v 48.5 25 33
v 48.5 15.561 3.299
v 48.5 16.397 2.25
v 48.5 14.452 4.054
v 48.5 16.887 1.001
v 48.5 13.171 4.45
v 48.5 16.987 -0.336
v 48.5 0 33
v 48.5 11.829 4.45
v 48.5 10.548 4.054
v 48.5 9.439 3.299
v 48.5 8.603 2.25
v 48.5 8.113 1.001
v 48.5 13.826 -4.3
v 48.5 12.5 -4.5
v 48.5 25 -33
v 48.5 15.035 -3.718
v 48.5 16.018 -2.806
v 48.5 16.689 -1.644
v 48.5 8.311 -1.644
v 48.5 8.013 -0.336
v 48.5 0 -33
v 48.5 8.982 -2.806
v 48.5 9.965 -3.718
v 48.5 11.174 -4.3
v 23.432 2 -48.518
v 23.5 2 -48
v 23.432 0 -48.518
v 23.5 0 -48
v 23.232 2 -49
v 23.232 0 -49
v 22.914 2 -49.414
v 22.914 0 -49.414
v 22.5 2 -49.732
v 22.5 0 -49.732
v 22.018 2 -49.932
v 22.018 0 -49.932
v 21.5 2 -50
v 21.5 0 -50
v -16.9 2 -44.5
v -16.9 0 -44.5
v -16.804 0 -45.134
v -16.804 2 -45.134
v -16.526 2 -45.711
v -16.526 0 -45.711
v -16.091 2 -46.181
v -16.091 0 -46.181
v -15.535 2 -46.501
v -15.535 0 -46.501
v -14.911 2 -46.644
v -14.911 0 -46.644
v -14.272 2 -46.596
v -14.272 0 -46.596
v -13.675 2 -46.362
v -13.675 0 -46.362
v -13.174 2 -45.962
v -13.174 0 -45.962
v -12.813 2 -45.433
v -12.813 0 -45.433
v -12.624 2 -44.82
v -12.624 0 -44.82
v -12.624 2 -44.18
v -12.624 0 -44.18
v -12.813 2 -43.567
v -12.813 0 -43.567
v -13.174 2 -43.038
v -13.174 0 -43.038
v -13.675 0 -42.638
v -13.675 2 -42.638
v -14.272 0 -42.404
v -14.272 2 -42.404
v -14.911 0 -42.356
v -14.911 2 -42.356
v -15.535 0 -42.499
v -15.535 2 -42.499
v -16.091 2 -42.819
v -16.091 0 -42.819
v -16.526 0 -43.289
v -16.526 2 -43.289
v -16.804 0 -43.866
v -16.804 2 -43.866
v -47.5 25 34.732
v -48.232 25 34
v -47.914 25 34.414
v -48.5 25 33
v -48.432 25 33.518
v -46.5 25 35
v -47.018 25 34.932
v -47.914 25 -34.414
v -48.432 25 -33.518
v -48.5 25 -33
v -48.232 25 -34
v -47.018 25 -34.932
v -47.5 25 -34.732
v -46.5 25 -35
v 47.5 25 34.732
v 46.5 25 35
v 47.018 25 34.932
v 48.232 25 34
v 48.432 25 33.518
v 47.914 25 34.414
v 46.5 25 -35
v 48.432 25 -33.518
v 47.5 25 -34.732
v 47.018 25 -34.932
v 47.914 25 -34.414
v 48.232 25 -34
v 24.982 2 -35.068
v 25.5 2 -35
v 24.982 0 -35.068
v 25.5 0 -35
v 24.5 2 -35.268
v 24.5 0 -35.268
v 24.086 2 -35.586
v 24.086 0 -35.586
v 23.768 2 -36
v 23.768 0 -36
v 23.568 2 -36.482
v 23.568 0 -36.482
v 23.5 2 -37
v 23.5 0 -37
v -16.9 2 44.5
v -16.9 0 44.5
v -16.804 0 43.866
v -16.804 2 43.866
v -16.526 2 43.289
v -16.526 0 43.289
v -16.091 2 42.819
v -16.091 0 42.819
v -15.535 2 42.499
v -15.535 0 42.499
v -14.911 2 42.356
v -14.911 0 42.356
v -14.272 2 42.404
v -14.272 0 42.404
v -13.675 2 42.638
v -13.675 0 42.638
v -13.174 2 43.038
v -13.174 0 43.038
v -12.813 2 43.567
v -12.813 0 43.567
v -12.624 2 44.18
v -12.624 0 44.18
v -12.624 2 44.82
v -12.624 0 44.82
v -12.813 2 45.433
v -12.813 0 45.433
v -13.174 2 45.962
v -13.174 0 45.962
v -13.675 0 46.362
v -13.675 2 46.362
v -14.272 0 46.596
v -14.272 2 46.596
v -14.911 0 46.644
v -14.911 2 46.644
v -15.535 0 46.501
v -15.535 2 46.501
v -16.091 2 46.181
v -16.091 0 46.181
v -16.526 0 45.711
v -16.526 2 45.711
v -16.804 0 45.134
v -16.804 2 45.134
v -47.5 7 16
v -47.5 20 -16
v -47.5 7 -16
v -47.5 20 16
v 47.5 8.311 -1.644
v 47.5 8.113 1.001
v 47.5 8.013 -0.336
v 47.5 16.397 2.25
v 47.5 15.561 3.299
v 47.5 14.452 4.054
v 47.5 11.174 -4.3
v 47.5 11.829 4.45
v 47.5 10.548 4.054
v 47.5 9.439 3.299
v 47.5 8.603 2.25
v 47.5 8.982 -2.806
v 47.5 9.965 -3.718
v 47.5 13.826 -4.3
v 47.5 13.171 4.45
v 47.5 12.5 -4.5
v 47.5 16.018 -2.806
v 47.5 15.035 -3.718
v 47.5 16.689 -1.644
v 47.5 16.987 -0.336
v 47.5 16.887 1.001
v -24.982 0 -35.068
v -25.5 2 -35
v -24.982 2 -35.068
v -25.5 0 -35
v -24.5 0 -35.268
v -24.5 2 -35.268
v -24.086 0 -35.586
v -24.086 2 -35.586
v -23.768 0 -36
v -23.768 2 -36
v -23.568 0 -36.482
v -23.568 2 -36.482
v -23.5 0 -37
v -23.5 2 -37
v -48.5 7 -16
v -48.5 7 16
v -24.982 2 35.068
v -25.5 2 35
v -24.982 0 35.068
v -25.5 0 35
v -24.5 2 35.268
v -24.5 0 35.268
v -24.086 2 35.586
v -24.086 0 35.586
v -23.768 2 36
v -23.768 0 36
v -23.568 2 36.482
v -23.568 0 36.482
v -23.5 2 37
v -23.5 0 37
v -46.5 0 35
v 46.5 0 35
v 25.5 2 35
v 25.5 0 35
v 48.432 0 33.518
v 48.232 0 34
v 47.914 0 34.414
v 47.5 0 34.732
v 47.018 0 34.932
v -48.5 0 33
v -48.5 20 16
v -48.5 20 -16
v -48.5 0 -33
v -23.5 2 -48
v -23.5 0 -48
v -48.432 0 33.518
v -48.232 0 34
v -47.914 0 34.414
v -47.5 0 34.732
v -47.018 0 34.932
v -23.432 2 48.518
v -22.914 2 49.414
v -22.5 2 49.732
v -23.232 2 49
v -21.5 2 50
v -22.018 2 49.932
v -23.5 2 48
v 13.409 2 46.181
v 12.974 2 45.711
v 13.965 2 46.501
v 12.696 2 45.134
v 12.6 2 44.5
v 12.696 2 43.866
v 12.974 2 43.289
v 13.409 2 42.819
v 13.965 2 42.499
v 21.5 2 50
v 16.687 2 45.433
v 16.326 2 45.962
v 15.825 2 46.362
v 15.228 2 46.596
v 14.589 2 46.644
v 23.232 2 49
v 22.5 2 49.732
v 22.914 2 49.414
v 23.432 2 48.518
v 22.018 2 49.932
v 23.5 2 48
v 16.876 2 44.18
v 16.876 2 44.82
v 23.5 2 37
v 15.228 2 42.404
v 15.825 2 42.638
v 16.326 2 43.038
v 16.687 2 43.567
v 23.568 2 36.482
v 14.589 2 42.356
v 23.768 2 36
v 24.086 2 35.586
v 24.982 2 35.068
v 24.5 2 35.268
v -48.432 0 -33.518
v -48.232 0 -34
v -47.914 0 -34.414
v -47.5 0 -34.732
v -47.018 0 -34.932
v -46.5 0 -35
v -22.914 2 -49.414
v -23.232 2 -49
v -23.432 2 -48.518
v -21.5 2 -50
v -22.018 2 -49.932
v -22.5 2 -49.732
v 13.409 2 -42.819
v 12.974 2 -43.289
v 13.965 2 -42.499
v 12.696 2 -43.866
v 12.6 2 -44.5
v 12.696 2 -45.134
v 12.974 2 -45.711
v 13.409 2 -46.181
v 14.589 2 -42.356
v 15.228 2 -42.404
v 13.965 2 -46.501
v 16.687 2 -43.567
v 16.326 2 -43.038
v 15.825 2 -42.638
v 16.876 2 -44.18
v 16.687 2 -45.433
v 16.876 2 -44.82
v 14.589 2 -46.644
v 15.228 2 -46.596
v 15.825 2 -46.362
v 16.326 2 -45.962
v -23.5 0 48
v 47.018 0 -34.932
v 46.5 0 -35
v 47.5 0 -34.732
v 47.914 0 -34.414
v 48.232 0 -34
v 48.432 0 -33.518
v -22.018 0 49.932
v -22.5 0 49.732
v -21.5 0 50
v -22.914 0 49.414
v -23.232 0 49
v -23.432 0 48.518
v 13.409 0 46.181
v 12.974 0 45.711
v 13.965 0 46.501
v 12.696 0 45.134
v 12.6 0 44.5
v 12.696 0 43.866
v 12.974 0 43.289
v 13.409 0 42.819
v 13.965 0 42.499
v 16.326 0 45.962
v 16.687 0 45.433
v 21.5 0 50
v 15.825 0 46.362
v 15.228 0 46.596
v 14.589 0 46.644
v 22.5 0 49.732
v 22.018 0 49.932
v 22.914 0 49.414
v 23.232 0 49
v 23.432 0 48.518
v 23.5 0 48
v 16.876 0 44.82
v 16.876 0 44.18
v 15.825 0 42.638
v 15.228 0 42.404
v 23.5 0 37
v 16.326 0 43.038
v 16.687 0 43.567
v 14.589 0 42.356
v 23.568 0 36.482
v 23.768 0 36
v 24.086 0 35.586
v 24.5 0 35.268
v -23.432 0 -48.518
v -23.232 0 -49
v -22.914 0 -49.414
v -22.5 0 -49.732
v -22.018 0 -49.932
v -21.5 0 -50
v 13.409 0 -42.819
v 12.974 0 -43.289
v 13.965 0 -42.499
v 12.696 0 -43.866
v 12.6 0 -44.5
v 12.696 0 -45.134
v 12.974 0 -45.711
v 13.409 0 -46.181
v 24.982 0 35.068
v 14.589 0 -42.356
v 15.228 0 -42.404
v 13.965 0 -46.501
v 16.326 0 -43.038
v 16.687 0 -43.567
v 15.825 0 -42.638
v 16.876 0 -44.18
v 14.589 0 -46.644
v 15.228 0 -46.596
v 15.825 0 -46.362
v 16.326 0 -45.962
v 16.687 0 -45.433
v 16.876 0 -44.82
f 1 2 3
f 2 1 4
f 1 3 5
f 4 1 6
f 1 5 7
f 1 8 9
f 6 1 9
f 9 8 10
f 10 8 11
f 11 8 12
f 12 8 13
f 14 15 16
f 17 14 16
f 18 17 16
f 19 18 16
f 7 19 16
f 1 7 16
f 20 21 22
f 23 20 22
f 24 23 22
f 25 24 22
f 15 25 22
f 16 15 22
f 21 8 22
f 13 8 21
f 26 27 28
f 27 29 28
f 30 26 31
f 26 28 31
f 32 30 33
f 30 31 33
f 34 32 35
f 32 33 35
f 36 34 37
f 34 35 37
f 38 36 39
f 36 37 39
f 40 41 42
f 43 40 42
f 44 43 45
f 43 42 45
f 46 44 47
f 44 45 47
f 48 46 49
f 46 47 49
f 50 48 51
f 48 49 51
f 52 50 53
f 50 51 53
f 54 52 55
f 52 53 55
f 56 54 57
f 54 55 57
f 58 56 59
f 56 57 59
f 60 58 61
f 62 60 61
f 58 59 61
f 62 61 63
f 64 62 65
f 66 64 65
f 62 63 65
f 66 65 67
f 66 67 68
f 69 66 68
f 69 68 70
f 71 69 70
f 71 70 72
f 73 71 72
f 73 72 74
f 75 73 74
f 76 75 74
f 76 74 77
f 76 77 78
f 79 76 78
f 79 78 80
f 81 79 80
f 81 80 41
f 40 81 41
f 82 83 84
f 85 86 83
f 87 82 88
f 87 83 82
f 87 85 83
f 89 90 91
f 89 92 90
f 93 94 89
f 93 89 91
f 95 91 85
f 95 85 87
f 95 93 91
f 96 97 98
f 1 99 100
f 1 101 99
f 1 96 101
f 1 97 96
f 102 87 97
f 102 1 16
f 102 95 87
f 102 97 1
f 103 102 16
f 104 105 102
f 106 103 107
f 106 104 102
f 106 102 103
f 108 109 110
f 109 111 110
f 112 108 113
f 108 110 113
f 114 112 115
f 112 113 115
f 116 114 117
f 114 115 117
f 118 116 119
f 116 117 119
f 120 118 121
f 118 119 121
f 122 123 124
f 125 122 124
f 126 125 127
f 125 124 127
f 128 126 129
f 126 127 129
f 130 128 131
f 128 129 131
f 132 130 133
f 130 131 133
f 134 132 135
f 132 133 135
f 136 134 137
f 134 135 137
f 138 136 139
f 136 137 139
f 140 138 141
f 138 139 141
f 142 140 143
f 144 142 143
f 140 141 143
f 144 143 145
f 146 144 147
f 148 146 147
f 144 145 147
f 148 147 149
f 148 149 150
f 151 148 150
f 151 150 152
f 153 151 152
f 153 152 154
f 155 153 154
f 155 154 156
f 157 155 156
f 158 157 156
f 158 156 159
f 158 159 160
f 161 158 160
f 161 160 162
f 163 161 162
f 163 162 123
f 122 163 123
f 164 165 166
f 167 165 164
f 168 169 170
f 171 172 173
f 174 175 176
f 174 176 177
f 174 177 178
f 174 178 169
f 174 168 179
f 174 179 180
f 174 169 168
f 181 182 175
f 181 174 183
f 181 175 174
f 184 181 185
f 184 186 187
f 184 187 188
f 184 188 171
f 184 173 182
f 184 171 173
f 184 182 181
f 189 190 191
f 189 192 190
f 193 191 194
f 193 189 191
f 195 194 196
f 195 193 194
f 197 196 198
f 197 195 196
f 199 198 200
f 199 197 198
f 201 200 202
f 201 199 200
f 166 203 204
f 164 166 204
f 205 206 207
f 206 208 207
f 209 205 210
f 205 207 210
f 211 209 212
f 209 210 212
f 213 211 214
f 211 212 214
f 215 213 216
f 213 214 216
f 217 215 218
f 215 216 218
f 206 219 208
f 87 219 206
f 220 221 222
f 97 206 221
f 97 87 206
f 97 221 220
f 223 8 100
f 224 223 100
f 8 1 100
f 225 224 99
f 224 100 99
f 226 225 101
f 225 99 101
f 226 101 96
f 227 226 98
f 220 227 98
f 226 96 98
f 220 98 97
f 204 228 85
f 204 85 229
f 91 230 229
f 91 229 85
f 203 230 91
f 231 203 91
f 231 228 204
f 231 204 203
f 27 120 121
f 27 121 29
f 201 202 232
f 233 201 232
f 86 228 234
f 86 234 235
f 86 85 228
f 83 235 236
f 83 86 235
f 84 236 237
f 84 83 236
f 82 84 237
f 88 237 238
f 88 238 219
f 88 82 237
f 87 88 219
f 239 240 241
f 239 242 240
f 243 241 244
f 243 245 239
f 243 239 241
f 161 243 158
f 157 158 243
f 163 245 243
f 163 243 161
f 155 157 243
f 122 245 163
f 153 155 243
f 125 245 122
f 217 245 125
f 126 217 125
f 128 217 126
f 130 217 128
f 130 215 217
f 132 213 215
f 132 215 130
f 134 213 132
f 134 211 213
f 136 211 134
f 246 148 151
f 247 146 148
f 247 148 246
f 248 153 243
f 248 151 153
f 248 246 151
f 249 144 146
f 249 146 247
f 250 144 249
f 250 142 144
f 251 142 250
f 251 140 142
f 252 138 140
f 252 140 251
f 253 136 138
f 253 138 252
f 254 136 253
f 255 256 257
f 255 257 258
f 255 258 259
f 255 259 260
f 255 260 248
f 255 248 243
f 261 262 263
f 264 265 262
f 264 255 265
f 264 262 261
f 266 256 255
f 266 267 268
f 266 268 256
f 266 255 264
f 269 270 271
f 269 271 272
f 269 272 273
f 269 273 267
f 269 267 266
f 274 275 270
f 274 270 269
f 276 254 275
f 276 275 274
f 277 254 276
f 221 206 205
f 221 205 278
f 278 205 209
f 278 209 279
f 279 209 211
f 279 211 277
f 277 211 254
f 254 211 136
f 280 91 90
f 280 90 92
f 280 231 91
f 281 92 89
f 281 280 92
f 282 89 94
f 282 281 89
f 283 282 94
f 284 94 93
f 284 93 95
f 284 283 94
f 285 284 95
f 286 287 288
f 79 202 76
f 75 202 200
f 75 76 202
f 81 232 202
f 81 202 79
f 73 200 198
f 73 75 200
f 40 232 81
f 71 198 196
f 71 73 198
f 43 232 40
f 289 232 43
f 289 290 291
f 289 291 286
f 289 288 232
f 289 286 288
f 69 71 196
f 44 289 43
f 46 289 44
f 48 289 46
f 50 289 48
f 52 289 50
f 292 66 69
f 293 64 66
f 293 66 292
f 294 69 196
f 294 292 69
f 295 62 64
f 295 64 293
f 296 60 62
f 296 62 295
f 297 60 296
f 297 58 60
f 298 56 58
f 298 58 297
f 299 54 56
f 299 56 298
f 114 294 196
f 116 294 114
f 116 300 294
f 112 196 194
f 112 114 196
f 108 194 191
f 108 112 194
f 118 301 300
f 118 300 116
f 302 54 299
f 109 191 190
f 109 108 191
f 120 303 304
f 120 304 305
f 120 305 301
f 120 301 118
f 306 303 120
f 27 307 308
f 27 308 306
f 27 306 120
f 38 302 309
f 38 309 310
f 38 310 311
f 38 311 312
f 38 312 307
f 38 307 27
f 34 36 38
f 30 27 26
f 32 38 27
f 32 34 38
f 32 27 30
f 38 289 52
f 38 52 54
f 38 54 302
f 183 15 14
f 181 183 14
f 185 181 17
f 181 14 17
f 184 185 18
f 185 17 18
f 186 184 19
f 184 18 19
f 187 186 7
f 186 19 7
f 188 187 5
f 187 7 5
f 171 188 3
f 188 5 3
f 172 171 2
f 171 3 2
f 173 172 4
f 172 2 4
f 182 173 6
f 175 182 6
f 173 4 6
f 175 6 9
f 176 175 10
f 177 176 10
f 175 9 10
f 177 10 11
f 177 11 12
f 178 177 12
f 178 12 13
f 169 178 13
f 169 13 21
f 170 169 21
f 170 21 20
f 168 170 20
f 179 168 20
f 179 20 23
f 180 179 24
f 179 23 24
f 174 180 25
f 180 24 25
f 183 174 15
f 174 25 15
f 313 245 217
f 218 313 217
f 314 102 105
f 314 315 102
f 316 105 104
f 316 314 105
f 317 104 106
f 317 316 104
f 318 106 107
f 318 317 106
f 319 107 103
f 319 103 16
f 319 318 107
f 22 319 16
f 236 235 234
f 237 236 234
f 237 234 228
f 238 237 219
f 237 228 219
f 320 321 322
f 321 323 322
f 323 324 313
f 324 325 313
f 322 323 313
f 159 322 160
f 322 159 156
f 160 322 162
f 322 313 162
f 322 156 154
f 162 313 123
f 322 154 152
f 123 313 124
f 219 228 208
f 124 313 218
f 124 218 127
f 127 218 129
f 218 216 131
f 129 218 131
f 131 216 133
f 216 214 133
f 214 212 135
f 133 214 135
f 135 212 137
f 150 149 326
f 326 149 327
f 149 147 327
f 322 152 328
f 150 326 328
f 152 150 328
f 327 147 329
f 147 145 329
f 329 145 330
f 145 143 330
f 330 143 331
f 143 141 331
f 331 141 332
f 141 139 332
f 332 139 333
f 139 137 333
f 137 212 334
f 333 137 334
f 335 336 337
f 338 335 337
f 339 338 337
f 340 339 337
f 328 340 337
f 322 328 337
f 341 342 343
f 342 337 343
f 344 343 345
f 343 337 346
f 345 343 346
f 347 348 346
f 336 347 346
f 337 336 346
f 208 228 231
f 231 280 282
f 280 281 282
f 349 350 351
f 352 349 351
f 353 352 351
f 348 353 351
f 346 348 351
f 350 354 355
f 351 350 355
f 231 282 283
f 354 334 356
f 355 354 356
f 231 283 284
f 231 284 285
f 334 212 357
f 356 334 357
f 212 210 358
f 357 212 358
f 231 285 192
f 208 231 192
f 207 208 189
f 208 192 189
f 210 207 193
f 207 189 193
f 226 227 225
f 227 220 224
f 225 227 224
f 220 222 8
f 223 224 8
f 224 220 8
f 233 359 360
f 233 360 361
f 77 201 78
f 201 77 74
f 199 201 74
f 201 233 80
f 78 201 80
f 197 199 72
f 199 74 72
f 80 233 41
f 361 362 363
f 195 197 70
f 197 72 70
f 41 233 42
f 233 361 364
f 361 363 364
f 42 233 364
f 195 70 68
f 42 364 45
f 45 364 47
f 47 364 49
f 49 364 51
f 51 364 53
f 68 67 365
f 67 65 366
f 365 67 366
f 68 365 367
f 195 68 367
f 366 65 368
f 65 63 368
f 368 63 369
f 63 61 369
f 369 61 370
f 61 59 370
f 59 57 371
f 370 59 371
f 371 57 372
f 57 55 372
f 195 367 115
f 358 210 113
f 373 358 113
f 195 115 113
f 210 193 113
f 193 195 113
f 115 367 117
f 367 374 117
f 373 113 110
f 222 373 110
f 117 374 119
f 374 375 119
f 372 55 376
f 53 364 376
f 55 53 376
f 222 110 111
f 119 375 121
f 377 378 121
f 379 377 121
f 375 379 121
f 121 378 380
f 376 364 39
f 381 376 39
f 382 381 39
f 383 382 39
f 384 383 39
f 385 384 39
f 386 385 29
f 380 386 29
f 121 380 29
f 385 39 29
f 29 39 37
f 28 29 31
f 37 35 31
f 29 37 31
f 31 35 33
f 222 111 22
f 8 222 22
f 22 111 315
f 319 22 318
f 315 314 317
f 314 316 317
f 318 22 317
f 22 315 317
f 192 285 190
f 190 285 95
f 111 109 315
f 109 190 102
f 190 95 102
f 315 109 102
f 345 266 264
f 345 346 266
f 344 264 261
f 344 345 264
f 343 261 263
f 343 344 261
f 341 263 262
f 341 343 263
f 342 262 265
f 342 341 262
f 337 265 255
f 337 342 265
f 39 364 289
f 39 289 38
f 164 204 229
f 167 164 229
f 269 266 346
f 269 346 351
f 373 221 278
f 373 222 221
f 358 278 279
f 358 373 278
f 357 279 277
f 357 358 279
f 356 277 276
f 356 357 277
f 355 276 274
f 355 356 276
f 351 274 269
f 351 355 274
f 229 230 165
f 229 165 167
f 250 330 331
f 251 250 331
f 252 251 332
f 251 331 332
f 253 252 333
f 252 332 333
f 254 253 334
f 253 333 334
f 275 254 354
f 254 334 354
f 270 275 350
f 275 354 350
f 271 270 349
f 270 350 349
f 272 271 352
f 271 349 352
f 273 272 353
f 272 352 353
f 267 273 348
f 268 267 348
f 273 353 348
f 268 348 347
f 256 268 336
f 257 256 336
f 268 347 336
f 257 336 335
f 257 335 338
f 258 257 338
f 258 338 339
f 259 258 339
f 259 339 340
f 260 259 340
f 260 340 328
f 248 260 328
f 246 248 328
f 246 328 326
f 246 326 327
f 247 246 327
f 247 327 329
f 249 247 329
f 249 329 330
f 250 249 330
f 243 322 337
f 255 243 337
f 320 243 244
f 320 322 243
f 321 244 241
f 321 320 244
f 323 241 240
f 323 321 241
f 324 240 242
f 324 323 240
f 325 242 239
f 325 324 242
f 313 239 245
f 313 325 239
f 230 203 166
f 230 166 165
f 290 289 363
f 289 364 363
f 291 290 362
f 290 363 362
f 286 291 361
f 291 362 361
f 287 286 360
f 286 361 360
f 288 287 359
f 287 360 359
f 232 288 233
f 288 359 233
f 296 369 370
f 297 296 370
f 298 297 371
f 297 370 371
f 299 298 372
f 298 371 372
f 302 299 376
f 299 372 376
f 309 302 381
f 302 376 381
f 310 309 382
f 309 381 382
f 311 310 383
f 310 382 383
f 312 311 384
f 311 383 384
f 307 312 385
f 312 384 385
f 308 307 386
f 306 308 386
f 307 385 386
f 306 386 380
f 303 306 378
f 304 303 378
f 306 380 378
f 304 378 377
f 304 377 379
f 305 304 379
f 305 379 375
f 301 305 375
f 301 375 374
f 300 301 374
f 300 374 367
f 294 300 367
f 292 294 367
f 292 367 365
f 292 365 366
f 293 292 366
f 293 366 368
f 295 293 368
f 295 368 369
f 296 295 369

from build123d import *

# Parameters (mm, degrees)
SKETCH1_W            = 97
SKETCH1_H            = 100
BOSS_EXTRUDE1_DEPTH  = 25
M4_CLEARANCE_HOLE1_D = 4.3
SKETCH5_W            = 32
SKETCH5_H            = 13
CUT_EXTRUDE1_DEPTH   = 1
SKETCH6_R            = 4.5
CUT_EXTRUDE2_DEPTH   = 1
SKETCH7_W            = 97
SKETCH7_H            = 15
CUT_EXTRUDE3_DEPTH   = 23
SKETCH8_W            = 25
SKETCH8_H            = 15
CUT_EXTRUDE4_DEPTH   = 74.357003756
FILLET1_R            = 2


with BuildPart() as part:
    # Sketch1 → Boss-Extrude1 (new body)
    with BuildSketch(Plane(origin=(0, 0, 0), x_dir=(1, 0, 0), z_dir=(0, 1, 0))):
        Rectangle(SKETCH1_W, SKETCH1_H)
    extrude(amount=BOSS_EXTRUDE1_DEPTH)

    # M4 Clearance Hole1 (through all)
    with Locations(Plane(origin=(0, 25, 0), x_dir=(1, 0, 0), z_dir=(0, 1, 0))):
        with Locations((-14.75, 44.5), (14.75, 44.5), (-14.75, -44.5), (14.75, -44.5)):
            Hole(M4_CLEARANCE_HOLE1_D / 2)

    # Sketch5 → Cut-Extrude1 (cut)
    with BuildSketch(Plane.ZY.offset(48.5)):
        with Locations((0, 13.5)):
            Rectangle(SKETCH5_W, SKETCH5_H)
    extrude(amount=-CUT_EXTRUDE1_DEPTH, mode=Mode.SUBTRACT)

    # Sketch6 → Cut-Extrude2 (cut)
    with BuildSketch(Plane(origin=(48.5, 0, 0), x_dir=(0, 0, -1), z_dir=(1, 0, 0))):
        with Locations((0, 12.5)):
            Circle(SKETCH6_R)
    extrude(amount=-CUT_EXTRUDE2_DEPTH, mode=Mode.SUBTRACT)

    # Sketch7 → Cut-Extrude3 (cut)
    with BuildSketch(Plane(origin=(0, 25, 0), x_dir=(1, 0, 0), z_dir=(0, 1, 0))):
        with Locations((0, 42.5)):
            Rectangle(SKETCH7_W, SKETCH7_H)
        with Locations((0, -42.5)):
            Rectangle(SKETCH7_W, SKETCH7_H)
    extrude(amount=-CUT_EXTRUDE3_DEPTH, mode=Mode.SUBTRACT)

    # Sketch8 → Cut-Extrude4 (cut, through all)
    with BuildSketch(Plane(origin=(0, 2, 0), x_dir=(1, 0, 0), z_dir=(0, 1, 0))):
        with Locations((-36, 42.5)):
            Rectangle(SKETCH8_W, SKETCH8_H)
        with Locations((36, 42.5)):
            Rectangle(SKETCH8_W, SKETCH8_H)
        with Locations((-36, -42.5)):
            Rectangle(SKETCH8_W, SKETCH8_H)
        with Locations((36, -42.5)):
            Rectangle(SKETCH8_W, SKETCH8_H)
    extrude(amount=-CUT_EXTRUDE4_DEPTH, mode=Mode.SUBTRACT)

    # Fillet1
    fillet1_edges = [part.edges().sort_by_distance(p)[0] for p in [
        (23.5, 1, -35),
        (23.5, 1, -50),
        (-23.5, 1, 35),
        (-23.5, 1, 50),
        (23.5, 1, 50),
        (23.5, 1, 35),
        (-23.5, 1, -50),
        (-23.5, 1, -35),
        (48.5, 12.5, -35),
        (-48.5, 12.5, -35),
        (48.5, 12.5, 35),
        (-48.5, 12.5, 35),
    ]]
    fillet(fillet1_edges, radius=FILLET1_R)


solid = part.part
